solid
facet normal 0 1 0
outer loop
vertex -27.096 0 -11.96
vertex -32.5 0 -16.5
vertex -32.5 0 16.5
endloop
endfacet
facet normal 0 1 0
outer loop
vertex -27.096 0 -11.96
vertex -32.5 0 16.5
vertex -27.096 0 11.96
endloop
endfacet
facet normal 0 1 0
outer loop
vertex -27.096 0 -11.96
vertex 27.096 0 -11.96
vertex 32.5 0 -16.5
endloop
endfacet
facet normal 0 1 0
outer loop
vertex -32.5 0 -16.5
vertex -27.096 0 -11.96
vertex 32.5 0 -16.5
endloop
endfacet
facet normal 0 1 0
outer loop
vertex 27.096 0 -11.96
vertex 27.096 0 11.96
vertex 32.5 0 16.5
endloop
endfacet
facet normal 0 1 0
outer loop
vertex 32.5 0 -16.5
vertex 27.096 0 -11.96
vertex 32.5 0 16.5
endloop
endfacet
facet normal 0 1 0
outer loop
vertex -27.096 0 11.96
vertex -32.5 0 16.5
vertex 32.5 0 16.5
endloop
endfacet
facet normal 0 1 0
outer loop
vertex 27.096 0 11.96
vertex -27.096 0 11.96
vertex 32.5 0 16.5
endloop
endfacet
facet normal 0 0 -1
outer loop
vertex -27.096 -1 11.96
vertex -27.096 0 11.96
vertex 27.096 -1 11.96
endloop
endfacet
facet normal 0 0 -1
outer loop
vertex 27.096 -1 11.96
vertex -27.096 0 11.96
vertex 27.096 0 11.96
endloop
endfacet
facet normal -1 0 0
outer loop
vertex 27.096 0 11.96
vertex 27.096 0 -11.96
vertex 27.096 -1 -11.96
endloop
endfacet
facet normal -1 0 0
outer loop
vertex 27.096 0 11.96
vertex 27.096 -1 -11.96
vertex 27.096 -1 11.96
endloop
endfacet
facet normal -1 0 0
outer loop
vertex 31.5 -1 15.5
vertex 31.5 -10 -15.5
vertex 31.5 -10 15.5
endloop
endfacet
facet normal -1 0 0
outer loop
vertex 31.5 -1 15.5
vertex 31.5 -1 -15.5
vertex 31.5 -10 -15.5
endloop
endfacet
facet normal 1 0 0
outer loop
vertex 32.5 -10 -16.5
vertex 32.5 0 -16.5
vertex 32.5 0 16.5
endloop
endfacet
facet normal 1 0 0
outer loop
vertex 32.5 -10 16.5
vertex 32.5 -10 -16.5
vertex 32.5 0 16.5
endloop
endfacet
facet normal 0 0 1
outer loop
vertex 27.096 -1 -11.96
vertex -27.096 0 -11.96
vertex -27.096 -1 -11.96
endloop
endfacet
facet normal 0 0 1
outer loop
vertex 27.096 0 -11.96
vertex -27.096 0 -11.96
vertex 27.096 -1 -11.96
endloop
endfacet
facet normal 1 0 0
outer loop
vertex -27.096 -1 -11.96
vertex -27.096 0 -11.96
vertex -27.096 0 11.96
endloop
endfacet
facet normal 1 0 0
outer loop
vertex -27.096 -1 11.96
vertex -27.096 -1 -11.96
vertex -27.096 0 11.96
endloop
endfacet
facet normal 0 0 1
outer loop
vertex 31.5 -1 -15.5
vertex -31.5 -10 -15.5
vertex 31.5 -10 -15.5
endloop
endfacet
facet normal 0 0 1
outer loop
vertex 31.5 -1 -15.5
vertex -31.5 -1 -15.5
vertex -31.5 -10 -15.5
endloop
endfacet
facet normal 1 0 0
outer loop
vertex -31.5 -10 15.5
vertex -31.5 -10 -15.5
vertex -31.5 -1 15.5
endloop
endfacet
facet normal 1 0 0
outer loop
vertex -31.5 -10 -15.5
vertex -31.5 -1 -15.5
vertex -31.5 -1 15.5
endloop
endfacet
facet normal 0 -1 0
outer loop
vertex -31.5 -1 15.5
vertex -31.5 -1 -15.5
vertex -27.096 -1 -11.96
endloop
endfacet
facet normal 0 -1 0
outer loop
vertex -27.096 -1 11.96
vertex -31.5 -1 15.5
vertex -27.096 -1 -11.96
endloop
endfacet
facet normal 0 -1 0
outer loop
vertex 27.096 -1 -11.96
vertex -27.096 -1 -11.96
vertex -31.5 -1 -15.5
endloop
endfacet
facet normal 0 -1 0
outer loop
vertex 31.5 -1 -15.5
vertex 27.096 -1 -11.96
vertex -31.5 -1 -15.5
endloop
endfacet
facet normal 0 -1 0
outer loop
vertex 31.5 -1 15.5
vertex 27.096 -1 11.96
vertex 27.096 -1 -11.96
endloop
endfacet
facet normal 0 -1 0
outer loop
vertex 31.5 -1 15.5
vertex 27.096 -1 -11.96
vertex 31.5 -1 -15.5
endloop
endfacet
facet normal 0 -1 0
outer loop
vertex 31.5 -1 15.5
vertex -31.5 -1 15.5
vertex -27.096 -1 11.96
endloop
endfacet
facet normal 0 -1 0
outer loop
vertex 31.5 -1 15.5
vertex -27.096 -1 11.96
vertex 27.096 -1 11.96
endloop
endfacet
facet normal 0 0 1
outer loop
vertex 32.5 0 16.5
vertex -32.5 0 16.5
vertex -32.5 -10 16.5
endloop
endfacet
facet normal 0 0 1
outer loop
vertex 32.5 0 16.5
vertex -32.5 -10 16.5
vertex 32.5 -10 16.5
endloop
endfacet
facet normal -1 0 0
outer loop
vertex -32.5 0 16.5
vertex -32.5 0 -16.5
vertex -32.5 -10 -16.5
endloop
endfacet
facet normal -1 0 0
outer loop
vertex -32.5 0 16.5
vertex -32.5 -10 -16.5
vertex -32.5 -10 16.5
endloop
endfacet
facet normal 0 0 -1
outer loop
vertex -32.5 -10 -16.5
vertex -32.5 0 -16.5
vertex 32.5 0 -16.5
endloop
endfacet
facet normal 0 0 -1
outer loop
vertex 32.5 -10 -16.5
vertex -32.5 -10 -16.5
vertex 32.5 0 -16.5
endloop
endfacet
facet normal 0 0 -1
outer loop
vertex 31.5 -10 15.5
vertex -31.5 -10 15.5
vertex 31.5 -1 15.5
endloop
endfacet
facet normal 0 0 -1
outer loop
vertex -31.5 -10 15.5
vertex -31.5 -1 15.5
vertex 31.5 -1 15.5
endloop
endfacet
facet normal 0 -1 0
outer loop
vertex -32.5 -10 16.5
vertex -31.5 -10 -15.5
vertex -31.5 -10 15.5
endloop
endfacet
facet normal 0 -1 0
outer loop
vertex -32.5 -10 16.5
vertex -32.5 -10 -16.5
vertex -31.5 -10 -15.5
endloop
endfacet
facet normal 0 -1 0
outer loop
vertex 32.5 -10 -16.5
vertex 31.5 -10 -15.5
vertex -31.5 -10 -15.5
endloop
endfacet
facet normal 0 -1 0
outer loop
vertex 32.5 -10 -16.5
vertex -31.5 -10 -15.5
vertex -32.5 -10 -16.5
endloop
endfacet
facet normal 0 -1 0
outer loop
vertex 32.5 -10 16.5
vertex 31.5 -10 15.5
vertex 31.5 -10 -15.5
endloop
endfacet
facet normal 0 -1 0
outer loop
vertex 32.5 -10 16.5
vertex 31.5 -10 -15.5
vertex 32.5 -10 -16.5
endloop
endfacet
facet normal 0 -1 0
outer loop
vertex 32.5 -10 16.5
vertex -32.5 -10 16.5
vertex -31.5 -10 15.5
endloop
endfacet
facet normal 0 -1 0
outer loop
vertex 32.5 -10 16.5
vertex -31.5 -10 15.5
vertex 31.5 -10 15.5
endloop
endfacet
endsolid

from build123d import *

# Parameters (mm, degrees)
F0_W     = 65
F0_H     = 33
F0_W_2   = 54.1921891272
F0_H_2   = 23.9197313786
F1_DEPTH = 10
F2_T     = -1
F3_DEPTH = 73.8002602011


with BuildPart() as f1:
    # F0 (on Front) → F1 (new body)
    with BuildSketch(Plane.XZ):
        Rectangle(F0_W, F0_H)
        Rectangle(F0_W_2, F0_H_2, mode=Mode.SUBTRACT)
        Rectangle(F0_W_2, F0_H_2)
    extrude(amount=F1_DEPTH)

    # F2
    f2_openings = [f1.faces().sort_by_distance(p)[0] for p in [
        (0, -10, 0),
    ]]
    offset(amount=F2_T, openings=f2_openings)

    # F0 (on Front) → F3 (cut)
    with BuildSketch(Plane.XZ):
        Rectangle(F0_W_2, F0_H_2)
    extrude(amount=F3_DEPTH, mode=Mode.SUBTRACT)


solid = f1.part
